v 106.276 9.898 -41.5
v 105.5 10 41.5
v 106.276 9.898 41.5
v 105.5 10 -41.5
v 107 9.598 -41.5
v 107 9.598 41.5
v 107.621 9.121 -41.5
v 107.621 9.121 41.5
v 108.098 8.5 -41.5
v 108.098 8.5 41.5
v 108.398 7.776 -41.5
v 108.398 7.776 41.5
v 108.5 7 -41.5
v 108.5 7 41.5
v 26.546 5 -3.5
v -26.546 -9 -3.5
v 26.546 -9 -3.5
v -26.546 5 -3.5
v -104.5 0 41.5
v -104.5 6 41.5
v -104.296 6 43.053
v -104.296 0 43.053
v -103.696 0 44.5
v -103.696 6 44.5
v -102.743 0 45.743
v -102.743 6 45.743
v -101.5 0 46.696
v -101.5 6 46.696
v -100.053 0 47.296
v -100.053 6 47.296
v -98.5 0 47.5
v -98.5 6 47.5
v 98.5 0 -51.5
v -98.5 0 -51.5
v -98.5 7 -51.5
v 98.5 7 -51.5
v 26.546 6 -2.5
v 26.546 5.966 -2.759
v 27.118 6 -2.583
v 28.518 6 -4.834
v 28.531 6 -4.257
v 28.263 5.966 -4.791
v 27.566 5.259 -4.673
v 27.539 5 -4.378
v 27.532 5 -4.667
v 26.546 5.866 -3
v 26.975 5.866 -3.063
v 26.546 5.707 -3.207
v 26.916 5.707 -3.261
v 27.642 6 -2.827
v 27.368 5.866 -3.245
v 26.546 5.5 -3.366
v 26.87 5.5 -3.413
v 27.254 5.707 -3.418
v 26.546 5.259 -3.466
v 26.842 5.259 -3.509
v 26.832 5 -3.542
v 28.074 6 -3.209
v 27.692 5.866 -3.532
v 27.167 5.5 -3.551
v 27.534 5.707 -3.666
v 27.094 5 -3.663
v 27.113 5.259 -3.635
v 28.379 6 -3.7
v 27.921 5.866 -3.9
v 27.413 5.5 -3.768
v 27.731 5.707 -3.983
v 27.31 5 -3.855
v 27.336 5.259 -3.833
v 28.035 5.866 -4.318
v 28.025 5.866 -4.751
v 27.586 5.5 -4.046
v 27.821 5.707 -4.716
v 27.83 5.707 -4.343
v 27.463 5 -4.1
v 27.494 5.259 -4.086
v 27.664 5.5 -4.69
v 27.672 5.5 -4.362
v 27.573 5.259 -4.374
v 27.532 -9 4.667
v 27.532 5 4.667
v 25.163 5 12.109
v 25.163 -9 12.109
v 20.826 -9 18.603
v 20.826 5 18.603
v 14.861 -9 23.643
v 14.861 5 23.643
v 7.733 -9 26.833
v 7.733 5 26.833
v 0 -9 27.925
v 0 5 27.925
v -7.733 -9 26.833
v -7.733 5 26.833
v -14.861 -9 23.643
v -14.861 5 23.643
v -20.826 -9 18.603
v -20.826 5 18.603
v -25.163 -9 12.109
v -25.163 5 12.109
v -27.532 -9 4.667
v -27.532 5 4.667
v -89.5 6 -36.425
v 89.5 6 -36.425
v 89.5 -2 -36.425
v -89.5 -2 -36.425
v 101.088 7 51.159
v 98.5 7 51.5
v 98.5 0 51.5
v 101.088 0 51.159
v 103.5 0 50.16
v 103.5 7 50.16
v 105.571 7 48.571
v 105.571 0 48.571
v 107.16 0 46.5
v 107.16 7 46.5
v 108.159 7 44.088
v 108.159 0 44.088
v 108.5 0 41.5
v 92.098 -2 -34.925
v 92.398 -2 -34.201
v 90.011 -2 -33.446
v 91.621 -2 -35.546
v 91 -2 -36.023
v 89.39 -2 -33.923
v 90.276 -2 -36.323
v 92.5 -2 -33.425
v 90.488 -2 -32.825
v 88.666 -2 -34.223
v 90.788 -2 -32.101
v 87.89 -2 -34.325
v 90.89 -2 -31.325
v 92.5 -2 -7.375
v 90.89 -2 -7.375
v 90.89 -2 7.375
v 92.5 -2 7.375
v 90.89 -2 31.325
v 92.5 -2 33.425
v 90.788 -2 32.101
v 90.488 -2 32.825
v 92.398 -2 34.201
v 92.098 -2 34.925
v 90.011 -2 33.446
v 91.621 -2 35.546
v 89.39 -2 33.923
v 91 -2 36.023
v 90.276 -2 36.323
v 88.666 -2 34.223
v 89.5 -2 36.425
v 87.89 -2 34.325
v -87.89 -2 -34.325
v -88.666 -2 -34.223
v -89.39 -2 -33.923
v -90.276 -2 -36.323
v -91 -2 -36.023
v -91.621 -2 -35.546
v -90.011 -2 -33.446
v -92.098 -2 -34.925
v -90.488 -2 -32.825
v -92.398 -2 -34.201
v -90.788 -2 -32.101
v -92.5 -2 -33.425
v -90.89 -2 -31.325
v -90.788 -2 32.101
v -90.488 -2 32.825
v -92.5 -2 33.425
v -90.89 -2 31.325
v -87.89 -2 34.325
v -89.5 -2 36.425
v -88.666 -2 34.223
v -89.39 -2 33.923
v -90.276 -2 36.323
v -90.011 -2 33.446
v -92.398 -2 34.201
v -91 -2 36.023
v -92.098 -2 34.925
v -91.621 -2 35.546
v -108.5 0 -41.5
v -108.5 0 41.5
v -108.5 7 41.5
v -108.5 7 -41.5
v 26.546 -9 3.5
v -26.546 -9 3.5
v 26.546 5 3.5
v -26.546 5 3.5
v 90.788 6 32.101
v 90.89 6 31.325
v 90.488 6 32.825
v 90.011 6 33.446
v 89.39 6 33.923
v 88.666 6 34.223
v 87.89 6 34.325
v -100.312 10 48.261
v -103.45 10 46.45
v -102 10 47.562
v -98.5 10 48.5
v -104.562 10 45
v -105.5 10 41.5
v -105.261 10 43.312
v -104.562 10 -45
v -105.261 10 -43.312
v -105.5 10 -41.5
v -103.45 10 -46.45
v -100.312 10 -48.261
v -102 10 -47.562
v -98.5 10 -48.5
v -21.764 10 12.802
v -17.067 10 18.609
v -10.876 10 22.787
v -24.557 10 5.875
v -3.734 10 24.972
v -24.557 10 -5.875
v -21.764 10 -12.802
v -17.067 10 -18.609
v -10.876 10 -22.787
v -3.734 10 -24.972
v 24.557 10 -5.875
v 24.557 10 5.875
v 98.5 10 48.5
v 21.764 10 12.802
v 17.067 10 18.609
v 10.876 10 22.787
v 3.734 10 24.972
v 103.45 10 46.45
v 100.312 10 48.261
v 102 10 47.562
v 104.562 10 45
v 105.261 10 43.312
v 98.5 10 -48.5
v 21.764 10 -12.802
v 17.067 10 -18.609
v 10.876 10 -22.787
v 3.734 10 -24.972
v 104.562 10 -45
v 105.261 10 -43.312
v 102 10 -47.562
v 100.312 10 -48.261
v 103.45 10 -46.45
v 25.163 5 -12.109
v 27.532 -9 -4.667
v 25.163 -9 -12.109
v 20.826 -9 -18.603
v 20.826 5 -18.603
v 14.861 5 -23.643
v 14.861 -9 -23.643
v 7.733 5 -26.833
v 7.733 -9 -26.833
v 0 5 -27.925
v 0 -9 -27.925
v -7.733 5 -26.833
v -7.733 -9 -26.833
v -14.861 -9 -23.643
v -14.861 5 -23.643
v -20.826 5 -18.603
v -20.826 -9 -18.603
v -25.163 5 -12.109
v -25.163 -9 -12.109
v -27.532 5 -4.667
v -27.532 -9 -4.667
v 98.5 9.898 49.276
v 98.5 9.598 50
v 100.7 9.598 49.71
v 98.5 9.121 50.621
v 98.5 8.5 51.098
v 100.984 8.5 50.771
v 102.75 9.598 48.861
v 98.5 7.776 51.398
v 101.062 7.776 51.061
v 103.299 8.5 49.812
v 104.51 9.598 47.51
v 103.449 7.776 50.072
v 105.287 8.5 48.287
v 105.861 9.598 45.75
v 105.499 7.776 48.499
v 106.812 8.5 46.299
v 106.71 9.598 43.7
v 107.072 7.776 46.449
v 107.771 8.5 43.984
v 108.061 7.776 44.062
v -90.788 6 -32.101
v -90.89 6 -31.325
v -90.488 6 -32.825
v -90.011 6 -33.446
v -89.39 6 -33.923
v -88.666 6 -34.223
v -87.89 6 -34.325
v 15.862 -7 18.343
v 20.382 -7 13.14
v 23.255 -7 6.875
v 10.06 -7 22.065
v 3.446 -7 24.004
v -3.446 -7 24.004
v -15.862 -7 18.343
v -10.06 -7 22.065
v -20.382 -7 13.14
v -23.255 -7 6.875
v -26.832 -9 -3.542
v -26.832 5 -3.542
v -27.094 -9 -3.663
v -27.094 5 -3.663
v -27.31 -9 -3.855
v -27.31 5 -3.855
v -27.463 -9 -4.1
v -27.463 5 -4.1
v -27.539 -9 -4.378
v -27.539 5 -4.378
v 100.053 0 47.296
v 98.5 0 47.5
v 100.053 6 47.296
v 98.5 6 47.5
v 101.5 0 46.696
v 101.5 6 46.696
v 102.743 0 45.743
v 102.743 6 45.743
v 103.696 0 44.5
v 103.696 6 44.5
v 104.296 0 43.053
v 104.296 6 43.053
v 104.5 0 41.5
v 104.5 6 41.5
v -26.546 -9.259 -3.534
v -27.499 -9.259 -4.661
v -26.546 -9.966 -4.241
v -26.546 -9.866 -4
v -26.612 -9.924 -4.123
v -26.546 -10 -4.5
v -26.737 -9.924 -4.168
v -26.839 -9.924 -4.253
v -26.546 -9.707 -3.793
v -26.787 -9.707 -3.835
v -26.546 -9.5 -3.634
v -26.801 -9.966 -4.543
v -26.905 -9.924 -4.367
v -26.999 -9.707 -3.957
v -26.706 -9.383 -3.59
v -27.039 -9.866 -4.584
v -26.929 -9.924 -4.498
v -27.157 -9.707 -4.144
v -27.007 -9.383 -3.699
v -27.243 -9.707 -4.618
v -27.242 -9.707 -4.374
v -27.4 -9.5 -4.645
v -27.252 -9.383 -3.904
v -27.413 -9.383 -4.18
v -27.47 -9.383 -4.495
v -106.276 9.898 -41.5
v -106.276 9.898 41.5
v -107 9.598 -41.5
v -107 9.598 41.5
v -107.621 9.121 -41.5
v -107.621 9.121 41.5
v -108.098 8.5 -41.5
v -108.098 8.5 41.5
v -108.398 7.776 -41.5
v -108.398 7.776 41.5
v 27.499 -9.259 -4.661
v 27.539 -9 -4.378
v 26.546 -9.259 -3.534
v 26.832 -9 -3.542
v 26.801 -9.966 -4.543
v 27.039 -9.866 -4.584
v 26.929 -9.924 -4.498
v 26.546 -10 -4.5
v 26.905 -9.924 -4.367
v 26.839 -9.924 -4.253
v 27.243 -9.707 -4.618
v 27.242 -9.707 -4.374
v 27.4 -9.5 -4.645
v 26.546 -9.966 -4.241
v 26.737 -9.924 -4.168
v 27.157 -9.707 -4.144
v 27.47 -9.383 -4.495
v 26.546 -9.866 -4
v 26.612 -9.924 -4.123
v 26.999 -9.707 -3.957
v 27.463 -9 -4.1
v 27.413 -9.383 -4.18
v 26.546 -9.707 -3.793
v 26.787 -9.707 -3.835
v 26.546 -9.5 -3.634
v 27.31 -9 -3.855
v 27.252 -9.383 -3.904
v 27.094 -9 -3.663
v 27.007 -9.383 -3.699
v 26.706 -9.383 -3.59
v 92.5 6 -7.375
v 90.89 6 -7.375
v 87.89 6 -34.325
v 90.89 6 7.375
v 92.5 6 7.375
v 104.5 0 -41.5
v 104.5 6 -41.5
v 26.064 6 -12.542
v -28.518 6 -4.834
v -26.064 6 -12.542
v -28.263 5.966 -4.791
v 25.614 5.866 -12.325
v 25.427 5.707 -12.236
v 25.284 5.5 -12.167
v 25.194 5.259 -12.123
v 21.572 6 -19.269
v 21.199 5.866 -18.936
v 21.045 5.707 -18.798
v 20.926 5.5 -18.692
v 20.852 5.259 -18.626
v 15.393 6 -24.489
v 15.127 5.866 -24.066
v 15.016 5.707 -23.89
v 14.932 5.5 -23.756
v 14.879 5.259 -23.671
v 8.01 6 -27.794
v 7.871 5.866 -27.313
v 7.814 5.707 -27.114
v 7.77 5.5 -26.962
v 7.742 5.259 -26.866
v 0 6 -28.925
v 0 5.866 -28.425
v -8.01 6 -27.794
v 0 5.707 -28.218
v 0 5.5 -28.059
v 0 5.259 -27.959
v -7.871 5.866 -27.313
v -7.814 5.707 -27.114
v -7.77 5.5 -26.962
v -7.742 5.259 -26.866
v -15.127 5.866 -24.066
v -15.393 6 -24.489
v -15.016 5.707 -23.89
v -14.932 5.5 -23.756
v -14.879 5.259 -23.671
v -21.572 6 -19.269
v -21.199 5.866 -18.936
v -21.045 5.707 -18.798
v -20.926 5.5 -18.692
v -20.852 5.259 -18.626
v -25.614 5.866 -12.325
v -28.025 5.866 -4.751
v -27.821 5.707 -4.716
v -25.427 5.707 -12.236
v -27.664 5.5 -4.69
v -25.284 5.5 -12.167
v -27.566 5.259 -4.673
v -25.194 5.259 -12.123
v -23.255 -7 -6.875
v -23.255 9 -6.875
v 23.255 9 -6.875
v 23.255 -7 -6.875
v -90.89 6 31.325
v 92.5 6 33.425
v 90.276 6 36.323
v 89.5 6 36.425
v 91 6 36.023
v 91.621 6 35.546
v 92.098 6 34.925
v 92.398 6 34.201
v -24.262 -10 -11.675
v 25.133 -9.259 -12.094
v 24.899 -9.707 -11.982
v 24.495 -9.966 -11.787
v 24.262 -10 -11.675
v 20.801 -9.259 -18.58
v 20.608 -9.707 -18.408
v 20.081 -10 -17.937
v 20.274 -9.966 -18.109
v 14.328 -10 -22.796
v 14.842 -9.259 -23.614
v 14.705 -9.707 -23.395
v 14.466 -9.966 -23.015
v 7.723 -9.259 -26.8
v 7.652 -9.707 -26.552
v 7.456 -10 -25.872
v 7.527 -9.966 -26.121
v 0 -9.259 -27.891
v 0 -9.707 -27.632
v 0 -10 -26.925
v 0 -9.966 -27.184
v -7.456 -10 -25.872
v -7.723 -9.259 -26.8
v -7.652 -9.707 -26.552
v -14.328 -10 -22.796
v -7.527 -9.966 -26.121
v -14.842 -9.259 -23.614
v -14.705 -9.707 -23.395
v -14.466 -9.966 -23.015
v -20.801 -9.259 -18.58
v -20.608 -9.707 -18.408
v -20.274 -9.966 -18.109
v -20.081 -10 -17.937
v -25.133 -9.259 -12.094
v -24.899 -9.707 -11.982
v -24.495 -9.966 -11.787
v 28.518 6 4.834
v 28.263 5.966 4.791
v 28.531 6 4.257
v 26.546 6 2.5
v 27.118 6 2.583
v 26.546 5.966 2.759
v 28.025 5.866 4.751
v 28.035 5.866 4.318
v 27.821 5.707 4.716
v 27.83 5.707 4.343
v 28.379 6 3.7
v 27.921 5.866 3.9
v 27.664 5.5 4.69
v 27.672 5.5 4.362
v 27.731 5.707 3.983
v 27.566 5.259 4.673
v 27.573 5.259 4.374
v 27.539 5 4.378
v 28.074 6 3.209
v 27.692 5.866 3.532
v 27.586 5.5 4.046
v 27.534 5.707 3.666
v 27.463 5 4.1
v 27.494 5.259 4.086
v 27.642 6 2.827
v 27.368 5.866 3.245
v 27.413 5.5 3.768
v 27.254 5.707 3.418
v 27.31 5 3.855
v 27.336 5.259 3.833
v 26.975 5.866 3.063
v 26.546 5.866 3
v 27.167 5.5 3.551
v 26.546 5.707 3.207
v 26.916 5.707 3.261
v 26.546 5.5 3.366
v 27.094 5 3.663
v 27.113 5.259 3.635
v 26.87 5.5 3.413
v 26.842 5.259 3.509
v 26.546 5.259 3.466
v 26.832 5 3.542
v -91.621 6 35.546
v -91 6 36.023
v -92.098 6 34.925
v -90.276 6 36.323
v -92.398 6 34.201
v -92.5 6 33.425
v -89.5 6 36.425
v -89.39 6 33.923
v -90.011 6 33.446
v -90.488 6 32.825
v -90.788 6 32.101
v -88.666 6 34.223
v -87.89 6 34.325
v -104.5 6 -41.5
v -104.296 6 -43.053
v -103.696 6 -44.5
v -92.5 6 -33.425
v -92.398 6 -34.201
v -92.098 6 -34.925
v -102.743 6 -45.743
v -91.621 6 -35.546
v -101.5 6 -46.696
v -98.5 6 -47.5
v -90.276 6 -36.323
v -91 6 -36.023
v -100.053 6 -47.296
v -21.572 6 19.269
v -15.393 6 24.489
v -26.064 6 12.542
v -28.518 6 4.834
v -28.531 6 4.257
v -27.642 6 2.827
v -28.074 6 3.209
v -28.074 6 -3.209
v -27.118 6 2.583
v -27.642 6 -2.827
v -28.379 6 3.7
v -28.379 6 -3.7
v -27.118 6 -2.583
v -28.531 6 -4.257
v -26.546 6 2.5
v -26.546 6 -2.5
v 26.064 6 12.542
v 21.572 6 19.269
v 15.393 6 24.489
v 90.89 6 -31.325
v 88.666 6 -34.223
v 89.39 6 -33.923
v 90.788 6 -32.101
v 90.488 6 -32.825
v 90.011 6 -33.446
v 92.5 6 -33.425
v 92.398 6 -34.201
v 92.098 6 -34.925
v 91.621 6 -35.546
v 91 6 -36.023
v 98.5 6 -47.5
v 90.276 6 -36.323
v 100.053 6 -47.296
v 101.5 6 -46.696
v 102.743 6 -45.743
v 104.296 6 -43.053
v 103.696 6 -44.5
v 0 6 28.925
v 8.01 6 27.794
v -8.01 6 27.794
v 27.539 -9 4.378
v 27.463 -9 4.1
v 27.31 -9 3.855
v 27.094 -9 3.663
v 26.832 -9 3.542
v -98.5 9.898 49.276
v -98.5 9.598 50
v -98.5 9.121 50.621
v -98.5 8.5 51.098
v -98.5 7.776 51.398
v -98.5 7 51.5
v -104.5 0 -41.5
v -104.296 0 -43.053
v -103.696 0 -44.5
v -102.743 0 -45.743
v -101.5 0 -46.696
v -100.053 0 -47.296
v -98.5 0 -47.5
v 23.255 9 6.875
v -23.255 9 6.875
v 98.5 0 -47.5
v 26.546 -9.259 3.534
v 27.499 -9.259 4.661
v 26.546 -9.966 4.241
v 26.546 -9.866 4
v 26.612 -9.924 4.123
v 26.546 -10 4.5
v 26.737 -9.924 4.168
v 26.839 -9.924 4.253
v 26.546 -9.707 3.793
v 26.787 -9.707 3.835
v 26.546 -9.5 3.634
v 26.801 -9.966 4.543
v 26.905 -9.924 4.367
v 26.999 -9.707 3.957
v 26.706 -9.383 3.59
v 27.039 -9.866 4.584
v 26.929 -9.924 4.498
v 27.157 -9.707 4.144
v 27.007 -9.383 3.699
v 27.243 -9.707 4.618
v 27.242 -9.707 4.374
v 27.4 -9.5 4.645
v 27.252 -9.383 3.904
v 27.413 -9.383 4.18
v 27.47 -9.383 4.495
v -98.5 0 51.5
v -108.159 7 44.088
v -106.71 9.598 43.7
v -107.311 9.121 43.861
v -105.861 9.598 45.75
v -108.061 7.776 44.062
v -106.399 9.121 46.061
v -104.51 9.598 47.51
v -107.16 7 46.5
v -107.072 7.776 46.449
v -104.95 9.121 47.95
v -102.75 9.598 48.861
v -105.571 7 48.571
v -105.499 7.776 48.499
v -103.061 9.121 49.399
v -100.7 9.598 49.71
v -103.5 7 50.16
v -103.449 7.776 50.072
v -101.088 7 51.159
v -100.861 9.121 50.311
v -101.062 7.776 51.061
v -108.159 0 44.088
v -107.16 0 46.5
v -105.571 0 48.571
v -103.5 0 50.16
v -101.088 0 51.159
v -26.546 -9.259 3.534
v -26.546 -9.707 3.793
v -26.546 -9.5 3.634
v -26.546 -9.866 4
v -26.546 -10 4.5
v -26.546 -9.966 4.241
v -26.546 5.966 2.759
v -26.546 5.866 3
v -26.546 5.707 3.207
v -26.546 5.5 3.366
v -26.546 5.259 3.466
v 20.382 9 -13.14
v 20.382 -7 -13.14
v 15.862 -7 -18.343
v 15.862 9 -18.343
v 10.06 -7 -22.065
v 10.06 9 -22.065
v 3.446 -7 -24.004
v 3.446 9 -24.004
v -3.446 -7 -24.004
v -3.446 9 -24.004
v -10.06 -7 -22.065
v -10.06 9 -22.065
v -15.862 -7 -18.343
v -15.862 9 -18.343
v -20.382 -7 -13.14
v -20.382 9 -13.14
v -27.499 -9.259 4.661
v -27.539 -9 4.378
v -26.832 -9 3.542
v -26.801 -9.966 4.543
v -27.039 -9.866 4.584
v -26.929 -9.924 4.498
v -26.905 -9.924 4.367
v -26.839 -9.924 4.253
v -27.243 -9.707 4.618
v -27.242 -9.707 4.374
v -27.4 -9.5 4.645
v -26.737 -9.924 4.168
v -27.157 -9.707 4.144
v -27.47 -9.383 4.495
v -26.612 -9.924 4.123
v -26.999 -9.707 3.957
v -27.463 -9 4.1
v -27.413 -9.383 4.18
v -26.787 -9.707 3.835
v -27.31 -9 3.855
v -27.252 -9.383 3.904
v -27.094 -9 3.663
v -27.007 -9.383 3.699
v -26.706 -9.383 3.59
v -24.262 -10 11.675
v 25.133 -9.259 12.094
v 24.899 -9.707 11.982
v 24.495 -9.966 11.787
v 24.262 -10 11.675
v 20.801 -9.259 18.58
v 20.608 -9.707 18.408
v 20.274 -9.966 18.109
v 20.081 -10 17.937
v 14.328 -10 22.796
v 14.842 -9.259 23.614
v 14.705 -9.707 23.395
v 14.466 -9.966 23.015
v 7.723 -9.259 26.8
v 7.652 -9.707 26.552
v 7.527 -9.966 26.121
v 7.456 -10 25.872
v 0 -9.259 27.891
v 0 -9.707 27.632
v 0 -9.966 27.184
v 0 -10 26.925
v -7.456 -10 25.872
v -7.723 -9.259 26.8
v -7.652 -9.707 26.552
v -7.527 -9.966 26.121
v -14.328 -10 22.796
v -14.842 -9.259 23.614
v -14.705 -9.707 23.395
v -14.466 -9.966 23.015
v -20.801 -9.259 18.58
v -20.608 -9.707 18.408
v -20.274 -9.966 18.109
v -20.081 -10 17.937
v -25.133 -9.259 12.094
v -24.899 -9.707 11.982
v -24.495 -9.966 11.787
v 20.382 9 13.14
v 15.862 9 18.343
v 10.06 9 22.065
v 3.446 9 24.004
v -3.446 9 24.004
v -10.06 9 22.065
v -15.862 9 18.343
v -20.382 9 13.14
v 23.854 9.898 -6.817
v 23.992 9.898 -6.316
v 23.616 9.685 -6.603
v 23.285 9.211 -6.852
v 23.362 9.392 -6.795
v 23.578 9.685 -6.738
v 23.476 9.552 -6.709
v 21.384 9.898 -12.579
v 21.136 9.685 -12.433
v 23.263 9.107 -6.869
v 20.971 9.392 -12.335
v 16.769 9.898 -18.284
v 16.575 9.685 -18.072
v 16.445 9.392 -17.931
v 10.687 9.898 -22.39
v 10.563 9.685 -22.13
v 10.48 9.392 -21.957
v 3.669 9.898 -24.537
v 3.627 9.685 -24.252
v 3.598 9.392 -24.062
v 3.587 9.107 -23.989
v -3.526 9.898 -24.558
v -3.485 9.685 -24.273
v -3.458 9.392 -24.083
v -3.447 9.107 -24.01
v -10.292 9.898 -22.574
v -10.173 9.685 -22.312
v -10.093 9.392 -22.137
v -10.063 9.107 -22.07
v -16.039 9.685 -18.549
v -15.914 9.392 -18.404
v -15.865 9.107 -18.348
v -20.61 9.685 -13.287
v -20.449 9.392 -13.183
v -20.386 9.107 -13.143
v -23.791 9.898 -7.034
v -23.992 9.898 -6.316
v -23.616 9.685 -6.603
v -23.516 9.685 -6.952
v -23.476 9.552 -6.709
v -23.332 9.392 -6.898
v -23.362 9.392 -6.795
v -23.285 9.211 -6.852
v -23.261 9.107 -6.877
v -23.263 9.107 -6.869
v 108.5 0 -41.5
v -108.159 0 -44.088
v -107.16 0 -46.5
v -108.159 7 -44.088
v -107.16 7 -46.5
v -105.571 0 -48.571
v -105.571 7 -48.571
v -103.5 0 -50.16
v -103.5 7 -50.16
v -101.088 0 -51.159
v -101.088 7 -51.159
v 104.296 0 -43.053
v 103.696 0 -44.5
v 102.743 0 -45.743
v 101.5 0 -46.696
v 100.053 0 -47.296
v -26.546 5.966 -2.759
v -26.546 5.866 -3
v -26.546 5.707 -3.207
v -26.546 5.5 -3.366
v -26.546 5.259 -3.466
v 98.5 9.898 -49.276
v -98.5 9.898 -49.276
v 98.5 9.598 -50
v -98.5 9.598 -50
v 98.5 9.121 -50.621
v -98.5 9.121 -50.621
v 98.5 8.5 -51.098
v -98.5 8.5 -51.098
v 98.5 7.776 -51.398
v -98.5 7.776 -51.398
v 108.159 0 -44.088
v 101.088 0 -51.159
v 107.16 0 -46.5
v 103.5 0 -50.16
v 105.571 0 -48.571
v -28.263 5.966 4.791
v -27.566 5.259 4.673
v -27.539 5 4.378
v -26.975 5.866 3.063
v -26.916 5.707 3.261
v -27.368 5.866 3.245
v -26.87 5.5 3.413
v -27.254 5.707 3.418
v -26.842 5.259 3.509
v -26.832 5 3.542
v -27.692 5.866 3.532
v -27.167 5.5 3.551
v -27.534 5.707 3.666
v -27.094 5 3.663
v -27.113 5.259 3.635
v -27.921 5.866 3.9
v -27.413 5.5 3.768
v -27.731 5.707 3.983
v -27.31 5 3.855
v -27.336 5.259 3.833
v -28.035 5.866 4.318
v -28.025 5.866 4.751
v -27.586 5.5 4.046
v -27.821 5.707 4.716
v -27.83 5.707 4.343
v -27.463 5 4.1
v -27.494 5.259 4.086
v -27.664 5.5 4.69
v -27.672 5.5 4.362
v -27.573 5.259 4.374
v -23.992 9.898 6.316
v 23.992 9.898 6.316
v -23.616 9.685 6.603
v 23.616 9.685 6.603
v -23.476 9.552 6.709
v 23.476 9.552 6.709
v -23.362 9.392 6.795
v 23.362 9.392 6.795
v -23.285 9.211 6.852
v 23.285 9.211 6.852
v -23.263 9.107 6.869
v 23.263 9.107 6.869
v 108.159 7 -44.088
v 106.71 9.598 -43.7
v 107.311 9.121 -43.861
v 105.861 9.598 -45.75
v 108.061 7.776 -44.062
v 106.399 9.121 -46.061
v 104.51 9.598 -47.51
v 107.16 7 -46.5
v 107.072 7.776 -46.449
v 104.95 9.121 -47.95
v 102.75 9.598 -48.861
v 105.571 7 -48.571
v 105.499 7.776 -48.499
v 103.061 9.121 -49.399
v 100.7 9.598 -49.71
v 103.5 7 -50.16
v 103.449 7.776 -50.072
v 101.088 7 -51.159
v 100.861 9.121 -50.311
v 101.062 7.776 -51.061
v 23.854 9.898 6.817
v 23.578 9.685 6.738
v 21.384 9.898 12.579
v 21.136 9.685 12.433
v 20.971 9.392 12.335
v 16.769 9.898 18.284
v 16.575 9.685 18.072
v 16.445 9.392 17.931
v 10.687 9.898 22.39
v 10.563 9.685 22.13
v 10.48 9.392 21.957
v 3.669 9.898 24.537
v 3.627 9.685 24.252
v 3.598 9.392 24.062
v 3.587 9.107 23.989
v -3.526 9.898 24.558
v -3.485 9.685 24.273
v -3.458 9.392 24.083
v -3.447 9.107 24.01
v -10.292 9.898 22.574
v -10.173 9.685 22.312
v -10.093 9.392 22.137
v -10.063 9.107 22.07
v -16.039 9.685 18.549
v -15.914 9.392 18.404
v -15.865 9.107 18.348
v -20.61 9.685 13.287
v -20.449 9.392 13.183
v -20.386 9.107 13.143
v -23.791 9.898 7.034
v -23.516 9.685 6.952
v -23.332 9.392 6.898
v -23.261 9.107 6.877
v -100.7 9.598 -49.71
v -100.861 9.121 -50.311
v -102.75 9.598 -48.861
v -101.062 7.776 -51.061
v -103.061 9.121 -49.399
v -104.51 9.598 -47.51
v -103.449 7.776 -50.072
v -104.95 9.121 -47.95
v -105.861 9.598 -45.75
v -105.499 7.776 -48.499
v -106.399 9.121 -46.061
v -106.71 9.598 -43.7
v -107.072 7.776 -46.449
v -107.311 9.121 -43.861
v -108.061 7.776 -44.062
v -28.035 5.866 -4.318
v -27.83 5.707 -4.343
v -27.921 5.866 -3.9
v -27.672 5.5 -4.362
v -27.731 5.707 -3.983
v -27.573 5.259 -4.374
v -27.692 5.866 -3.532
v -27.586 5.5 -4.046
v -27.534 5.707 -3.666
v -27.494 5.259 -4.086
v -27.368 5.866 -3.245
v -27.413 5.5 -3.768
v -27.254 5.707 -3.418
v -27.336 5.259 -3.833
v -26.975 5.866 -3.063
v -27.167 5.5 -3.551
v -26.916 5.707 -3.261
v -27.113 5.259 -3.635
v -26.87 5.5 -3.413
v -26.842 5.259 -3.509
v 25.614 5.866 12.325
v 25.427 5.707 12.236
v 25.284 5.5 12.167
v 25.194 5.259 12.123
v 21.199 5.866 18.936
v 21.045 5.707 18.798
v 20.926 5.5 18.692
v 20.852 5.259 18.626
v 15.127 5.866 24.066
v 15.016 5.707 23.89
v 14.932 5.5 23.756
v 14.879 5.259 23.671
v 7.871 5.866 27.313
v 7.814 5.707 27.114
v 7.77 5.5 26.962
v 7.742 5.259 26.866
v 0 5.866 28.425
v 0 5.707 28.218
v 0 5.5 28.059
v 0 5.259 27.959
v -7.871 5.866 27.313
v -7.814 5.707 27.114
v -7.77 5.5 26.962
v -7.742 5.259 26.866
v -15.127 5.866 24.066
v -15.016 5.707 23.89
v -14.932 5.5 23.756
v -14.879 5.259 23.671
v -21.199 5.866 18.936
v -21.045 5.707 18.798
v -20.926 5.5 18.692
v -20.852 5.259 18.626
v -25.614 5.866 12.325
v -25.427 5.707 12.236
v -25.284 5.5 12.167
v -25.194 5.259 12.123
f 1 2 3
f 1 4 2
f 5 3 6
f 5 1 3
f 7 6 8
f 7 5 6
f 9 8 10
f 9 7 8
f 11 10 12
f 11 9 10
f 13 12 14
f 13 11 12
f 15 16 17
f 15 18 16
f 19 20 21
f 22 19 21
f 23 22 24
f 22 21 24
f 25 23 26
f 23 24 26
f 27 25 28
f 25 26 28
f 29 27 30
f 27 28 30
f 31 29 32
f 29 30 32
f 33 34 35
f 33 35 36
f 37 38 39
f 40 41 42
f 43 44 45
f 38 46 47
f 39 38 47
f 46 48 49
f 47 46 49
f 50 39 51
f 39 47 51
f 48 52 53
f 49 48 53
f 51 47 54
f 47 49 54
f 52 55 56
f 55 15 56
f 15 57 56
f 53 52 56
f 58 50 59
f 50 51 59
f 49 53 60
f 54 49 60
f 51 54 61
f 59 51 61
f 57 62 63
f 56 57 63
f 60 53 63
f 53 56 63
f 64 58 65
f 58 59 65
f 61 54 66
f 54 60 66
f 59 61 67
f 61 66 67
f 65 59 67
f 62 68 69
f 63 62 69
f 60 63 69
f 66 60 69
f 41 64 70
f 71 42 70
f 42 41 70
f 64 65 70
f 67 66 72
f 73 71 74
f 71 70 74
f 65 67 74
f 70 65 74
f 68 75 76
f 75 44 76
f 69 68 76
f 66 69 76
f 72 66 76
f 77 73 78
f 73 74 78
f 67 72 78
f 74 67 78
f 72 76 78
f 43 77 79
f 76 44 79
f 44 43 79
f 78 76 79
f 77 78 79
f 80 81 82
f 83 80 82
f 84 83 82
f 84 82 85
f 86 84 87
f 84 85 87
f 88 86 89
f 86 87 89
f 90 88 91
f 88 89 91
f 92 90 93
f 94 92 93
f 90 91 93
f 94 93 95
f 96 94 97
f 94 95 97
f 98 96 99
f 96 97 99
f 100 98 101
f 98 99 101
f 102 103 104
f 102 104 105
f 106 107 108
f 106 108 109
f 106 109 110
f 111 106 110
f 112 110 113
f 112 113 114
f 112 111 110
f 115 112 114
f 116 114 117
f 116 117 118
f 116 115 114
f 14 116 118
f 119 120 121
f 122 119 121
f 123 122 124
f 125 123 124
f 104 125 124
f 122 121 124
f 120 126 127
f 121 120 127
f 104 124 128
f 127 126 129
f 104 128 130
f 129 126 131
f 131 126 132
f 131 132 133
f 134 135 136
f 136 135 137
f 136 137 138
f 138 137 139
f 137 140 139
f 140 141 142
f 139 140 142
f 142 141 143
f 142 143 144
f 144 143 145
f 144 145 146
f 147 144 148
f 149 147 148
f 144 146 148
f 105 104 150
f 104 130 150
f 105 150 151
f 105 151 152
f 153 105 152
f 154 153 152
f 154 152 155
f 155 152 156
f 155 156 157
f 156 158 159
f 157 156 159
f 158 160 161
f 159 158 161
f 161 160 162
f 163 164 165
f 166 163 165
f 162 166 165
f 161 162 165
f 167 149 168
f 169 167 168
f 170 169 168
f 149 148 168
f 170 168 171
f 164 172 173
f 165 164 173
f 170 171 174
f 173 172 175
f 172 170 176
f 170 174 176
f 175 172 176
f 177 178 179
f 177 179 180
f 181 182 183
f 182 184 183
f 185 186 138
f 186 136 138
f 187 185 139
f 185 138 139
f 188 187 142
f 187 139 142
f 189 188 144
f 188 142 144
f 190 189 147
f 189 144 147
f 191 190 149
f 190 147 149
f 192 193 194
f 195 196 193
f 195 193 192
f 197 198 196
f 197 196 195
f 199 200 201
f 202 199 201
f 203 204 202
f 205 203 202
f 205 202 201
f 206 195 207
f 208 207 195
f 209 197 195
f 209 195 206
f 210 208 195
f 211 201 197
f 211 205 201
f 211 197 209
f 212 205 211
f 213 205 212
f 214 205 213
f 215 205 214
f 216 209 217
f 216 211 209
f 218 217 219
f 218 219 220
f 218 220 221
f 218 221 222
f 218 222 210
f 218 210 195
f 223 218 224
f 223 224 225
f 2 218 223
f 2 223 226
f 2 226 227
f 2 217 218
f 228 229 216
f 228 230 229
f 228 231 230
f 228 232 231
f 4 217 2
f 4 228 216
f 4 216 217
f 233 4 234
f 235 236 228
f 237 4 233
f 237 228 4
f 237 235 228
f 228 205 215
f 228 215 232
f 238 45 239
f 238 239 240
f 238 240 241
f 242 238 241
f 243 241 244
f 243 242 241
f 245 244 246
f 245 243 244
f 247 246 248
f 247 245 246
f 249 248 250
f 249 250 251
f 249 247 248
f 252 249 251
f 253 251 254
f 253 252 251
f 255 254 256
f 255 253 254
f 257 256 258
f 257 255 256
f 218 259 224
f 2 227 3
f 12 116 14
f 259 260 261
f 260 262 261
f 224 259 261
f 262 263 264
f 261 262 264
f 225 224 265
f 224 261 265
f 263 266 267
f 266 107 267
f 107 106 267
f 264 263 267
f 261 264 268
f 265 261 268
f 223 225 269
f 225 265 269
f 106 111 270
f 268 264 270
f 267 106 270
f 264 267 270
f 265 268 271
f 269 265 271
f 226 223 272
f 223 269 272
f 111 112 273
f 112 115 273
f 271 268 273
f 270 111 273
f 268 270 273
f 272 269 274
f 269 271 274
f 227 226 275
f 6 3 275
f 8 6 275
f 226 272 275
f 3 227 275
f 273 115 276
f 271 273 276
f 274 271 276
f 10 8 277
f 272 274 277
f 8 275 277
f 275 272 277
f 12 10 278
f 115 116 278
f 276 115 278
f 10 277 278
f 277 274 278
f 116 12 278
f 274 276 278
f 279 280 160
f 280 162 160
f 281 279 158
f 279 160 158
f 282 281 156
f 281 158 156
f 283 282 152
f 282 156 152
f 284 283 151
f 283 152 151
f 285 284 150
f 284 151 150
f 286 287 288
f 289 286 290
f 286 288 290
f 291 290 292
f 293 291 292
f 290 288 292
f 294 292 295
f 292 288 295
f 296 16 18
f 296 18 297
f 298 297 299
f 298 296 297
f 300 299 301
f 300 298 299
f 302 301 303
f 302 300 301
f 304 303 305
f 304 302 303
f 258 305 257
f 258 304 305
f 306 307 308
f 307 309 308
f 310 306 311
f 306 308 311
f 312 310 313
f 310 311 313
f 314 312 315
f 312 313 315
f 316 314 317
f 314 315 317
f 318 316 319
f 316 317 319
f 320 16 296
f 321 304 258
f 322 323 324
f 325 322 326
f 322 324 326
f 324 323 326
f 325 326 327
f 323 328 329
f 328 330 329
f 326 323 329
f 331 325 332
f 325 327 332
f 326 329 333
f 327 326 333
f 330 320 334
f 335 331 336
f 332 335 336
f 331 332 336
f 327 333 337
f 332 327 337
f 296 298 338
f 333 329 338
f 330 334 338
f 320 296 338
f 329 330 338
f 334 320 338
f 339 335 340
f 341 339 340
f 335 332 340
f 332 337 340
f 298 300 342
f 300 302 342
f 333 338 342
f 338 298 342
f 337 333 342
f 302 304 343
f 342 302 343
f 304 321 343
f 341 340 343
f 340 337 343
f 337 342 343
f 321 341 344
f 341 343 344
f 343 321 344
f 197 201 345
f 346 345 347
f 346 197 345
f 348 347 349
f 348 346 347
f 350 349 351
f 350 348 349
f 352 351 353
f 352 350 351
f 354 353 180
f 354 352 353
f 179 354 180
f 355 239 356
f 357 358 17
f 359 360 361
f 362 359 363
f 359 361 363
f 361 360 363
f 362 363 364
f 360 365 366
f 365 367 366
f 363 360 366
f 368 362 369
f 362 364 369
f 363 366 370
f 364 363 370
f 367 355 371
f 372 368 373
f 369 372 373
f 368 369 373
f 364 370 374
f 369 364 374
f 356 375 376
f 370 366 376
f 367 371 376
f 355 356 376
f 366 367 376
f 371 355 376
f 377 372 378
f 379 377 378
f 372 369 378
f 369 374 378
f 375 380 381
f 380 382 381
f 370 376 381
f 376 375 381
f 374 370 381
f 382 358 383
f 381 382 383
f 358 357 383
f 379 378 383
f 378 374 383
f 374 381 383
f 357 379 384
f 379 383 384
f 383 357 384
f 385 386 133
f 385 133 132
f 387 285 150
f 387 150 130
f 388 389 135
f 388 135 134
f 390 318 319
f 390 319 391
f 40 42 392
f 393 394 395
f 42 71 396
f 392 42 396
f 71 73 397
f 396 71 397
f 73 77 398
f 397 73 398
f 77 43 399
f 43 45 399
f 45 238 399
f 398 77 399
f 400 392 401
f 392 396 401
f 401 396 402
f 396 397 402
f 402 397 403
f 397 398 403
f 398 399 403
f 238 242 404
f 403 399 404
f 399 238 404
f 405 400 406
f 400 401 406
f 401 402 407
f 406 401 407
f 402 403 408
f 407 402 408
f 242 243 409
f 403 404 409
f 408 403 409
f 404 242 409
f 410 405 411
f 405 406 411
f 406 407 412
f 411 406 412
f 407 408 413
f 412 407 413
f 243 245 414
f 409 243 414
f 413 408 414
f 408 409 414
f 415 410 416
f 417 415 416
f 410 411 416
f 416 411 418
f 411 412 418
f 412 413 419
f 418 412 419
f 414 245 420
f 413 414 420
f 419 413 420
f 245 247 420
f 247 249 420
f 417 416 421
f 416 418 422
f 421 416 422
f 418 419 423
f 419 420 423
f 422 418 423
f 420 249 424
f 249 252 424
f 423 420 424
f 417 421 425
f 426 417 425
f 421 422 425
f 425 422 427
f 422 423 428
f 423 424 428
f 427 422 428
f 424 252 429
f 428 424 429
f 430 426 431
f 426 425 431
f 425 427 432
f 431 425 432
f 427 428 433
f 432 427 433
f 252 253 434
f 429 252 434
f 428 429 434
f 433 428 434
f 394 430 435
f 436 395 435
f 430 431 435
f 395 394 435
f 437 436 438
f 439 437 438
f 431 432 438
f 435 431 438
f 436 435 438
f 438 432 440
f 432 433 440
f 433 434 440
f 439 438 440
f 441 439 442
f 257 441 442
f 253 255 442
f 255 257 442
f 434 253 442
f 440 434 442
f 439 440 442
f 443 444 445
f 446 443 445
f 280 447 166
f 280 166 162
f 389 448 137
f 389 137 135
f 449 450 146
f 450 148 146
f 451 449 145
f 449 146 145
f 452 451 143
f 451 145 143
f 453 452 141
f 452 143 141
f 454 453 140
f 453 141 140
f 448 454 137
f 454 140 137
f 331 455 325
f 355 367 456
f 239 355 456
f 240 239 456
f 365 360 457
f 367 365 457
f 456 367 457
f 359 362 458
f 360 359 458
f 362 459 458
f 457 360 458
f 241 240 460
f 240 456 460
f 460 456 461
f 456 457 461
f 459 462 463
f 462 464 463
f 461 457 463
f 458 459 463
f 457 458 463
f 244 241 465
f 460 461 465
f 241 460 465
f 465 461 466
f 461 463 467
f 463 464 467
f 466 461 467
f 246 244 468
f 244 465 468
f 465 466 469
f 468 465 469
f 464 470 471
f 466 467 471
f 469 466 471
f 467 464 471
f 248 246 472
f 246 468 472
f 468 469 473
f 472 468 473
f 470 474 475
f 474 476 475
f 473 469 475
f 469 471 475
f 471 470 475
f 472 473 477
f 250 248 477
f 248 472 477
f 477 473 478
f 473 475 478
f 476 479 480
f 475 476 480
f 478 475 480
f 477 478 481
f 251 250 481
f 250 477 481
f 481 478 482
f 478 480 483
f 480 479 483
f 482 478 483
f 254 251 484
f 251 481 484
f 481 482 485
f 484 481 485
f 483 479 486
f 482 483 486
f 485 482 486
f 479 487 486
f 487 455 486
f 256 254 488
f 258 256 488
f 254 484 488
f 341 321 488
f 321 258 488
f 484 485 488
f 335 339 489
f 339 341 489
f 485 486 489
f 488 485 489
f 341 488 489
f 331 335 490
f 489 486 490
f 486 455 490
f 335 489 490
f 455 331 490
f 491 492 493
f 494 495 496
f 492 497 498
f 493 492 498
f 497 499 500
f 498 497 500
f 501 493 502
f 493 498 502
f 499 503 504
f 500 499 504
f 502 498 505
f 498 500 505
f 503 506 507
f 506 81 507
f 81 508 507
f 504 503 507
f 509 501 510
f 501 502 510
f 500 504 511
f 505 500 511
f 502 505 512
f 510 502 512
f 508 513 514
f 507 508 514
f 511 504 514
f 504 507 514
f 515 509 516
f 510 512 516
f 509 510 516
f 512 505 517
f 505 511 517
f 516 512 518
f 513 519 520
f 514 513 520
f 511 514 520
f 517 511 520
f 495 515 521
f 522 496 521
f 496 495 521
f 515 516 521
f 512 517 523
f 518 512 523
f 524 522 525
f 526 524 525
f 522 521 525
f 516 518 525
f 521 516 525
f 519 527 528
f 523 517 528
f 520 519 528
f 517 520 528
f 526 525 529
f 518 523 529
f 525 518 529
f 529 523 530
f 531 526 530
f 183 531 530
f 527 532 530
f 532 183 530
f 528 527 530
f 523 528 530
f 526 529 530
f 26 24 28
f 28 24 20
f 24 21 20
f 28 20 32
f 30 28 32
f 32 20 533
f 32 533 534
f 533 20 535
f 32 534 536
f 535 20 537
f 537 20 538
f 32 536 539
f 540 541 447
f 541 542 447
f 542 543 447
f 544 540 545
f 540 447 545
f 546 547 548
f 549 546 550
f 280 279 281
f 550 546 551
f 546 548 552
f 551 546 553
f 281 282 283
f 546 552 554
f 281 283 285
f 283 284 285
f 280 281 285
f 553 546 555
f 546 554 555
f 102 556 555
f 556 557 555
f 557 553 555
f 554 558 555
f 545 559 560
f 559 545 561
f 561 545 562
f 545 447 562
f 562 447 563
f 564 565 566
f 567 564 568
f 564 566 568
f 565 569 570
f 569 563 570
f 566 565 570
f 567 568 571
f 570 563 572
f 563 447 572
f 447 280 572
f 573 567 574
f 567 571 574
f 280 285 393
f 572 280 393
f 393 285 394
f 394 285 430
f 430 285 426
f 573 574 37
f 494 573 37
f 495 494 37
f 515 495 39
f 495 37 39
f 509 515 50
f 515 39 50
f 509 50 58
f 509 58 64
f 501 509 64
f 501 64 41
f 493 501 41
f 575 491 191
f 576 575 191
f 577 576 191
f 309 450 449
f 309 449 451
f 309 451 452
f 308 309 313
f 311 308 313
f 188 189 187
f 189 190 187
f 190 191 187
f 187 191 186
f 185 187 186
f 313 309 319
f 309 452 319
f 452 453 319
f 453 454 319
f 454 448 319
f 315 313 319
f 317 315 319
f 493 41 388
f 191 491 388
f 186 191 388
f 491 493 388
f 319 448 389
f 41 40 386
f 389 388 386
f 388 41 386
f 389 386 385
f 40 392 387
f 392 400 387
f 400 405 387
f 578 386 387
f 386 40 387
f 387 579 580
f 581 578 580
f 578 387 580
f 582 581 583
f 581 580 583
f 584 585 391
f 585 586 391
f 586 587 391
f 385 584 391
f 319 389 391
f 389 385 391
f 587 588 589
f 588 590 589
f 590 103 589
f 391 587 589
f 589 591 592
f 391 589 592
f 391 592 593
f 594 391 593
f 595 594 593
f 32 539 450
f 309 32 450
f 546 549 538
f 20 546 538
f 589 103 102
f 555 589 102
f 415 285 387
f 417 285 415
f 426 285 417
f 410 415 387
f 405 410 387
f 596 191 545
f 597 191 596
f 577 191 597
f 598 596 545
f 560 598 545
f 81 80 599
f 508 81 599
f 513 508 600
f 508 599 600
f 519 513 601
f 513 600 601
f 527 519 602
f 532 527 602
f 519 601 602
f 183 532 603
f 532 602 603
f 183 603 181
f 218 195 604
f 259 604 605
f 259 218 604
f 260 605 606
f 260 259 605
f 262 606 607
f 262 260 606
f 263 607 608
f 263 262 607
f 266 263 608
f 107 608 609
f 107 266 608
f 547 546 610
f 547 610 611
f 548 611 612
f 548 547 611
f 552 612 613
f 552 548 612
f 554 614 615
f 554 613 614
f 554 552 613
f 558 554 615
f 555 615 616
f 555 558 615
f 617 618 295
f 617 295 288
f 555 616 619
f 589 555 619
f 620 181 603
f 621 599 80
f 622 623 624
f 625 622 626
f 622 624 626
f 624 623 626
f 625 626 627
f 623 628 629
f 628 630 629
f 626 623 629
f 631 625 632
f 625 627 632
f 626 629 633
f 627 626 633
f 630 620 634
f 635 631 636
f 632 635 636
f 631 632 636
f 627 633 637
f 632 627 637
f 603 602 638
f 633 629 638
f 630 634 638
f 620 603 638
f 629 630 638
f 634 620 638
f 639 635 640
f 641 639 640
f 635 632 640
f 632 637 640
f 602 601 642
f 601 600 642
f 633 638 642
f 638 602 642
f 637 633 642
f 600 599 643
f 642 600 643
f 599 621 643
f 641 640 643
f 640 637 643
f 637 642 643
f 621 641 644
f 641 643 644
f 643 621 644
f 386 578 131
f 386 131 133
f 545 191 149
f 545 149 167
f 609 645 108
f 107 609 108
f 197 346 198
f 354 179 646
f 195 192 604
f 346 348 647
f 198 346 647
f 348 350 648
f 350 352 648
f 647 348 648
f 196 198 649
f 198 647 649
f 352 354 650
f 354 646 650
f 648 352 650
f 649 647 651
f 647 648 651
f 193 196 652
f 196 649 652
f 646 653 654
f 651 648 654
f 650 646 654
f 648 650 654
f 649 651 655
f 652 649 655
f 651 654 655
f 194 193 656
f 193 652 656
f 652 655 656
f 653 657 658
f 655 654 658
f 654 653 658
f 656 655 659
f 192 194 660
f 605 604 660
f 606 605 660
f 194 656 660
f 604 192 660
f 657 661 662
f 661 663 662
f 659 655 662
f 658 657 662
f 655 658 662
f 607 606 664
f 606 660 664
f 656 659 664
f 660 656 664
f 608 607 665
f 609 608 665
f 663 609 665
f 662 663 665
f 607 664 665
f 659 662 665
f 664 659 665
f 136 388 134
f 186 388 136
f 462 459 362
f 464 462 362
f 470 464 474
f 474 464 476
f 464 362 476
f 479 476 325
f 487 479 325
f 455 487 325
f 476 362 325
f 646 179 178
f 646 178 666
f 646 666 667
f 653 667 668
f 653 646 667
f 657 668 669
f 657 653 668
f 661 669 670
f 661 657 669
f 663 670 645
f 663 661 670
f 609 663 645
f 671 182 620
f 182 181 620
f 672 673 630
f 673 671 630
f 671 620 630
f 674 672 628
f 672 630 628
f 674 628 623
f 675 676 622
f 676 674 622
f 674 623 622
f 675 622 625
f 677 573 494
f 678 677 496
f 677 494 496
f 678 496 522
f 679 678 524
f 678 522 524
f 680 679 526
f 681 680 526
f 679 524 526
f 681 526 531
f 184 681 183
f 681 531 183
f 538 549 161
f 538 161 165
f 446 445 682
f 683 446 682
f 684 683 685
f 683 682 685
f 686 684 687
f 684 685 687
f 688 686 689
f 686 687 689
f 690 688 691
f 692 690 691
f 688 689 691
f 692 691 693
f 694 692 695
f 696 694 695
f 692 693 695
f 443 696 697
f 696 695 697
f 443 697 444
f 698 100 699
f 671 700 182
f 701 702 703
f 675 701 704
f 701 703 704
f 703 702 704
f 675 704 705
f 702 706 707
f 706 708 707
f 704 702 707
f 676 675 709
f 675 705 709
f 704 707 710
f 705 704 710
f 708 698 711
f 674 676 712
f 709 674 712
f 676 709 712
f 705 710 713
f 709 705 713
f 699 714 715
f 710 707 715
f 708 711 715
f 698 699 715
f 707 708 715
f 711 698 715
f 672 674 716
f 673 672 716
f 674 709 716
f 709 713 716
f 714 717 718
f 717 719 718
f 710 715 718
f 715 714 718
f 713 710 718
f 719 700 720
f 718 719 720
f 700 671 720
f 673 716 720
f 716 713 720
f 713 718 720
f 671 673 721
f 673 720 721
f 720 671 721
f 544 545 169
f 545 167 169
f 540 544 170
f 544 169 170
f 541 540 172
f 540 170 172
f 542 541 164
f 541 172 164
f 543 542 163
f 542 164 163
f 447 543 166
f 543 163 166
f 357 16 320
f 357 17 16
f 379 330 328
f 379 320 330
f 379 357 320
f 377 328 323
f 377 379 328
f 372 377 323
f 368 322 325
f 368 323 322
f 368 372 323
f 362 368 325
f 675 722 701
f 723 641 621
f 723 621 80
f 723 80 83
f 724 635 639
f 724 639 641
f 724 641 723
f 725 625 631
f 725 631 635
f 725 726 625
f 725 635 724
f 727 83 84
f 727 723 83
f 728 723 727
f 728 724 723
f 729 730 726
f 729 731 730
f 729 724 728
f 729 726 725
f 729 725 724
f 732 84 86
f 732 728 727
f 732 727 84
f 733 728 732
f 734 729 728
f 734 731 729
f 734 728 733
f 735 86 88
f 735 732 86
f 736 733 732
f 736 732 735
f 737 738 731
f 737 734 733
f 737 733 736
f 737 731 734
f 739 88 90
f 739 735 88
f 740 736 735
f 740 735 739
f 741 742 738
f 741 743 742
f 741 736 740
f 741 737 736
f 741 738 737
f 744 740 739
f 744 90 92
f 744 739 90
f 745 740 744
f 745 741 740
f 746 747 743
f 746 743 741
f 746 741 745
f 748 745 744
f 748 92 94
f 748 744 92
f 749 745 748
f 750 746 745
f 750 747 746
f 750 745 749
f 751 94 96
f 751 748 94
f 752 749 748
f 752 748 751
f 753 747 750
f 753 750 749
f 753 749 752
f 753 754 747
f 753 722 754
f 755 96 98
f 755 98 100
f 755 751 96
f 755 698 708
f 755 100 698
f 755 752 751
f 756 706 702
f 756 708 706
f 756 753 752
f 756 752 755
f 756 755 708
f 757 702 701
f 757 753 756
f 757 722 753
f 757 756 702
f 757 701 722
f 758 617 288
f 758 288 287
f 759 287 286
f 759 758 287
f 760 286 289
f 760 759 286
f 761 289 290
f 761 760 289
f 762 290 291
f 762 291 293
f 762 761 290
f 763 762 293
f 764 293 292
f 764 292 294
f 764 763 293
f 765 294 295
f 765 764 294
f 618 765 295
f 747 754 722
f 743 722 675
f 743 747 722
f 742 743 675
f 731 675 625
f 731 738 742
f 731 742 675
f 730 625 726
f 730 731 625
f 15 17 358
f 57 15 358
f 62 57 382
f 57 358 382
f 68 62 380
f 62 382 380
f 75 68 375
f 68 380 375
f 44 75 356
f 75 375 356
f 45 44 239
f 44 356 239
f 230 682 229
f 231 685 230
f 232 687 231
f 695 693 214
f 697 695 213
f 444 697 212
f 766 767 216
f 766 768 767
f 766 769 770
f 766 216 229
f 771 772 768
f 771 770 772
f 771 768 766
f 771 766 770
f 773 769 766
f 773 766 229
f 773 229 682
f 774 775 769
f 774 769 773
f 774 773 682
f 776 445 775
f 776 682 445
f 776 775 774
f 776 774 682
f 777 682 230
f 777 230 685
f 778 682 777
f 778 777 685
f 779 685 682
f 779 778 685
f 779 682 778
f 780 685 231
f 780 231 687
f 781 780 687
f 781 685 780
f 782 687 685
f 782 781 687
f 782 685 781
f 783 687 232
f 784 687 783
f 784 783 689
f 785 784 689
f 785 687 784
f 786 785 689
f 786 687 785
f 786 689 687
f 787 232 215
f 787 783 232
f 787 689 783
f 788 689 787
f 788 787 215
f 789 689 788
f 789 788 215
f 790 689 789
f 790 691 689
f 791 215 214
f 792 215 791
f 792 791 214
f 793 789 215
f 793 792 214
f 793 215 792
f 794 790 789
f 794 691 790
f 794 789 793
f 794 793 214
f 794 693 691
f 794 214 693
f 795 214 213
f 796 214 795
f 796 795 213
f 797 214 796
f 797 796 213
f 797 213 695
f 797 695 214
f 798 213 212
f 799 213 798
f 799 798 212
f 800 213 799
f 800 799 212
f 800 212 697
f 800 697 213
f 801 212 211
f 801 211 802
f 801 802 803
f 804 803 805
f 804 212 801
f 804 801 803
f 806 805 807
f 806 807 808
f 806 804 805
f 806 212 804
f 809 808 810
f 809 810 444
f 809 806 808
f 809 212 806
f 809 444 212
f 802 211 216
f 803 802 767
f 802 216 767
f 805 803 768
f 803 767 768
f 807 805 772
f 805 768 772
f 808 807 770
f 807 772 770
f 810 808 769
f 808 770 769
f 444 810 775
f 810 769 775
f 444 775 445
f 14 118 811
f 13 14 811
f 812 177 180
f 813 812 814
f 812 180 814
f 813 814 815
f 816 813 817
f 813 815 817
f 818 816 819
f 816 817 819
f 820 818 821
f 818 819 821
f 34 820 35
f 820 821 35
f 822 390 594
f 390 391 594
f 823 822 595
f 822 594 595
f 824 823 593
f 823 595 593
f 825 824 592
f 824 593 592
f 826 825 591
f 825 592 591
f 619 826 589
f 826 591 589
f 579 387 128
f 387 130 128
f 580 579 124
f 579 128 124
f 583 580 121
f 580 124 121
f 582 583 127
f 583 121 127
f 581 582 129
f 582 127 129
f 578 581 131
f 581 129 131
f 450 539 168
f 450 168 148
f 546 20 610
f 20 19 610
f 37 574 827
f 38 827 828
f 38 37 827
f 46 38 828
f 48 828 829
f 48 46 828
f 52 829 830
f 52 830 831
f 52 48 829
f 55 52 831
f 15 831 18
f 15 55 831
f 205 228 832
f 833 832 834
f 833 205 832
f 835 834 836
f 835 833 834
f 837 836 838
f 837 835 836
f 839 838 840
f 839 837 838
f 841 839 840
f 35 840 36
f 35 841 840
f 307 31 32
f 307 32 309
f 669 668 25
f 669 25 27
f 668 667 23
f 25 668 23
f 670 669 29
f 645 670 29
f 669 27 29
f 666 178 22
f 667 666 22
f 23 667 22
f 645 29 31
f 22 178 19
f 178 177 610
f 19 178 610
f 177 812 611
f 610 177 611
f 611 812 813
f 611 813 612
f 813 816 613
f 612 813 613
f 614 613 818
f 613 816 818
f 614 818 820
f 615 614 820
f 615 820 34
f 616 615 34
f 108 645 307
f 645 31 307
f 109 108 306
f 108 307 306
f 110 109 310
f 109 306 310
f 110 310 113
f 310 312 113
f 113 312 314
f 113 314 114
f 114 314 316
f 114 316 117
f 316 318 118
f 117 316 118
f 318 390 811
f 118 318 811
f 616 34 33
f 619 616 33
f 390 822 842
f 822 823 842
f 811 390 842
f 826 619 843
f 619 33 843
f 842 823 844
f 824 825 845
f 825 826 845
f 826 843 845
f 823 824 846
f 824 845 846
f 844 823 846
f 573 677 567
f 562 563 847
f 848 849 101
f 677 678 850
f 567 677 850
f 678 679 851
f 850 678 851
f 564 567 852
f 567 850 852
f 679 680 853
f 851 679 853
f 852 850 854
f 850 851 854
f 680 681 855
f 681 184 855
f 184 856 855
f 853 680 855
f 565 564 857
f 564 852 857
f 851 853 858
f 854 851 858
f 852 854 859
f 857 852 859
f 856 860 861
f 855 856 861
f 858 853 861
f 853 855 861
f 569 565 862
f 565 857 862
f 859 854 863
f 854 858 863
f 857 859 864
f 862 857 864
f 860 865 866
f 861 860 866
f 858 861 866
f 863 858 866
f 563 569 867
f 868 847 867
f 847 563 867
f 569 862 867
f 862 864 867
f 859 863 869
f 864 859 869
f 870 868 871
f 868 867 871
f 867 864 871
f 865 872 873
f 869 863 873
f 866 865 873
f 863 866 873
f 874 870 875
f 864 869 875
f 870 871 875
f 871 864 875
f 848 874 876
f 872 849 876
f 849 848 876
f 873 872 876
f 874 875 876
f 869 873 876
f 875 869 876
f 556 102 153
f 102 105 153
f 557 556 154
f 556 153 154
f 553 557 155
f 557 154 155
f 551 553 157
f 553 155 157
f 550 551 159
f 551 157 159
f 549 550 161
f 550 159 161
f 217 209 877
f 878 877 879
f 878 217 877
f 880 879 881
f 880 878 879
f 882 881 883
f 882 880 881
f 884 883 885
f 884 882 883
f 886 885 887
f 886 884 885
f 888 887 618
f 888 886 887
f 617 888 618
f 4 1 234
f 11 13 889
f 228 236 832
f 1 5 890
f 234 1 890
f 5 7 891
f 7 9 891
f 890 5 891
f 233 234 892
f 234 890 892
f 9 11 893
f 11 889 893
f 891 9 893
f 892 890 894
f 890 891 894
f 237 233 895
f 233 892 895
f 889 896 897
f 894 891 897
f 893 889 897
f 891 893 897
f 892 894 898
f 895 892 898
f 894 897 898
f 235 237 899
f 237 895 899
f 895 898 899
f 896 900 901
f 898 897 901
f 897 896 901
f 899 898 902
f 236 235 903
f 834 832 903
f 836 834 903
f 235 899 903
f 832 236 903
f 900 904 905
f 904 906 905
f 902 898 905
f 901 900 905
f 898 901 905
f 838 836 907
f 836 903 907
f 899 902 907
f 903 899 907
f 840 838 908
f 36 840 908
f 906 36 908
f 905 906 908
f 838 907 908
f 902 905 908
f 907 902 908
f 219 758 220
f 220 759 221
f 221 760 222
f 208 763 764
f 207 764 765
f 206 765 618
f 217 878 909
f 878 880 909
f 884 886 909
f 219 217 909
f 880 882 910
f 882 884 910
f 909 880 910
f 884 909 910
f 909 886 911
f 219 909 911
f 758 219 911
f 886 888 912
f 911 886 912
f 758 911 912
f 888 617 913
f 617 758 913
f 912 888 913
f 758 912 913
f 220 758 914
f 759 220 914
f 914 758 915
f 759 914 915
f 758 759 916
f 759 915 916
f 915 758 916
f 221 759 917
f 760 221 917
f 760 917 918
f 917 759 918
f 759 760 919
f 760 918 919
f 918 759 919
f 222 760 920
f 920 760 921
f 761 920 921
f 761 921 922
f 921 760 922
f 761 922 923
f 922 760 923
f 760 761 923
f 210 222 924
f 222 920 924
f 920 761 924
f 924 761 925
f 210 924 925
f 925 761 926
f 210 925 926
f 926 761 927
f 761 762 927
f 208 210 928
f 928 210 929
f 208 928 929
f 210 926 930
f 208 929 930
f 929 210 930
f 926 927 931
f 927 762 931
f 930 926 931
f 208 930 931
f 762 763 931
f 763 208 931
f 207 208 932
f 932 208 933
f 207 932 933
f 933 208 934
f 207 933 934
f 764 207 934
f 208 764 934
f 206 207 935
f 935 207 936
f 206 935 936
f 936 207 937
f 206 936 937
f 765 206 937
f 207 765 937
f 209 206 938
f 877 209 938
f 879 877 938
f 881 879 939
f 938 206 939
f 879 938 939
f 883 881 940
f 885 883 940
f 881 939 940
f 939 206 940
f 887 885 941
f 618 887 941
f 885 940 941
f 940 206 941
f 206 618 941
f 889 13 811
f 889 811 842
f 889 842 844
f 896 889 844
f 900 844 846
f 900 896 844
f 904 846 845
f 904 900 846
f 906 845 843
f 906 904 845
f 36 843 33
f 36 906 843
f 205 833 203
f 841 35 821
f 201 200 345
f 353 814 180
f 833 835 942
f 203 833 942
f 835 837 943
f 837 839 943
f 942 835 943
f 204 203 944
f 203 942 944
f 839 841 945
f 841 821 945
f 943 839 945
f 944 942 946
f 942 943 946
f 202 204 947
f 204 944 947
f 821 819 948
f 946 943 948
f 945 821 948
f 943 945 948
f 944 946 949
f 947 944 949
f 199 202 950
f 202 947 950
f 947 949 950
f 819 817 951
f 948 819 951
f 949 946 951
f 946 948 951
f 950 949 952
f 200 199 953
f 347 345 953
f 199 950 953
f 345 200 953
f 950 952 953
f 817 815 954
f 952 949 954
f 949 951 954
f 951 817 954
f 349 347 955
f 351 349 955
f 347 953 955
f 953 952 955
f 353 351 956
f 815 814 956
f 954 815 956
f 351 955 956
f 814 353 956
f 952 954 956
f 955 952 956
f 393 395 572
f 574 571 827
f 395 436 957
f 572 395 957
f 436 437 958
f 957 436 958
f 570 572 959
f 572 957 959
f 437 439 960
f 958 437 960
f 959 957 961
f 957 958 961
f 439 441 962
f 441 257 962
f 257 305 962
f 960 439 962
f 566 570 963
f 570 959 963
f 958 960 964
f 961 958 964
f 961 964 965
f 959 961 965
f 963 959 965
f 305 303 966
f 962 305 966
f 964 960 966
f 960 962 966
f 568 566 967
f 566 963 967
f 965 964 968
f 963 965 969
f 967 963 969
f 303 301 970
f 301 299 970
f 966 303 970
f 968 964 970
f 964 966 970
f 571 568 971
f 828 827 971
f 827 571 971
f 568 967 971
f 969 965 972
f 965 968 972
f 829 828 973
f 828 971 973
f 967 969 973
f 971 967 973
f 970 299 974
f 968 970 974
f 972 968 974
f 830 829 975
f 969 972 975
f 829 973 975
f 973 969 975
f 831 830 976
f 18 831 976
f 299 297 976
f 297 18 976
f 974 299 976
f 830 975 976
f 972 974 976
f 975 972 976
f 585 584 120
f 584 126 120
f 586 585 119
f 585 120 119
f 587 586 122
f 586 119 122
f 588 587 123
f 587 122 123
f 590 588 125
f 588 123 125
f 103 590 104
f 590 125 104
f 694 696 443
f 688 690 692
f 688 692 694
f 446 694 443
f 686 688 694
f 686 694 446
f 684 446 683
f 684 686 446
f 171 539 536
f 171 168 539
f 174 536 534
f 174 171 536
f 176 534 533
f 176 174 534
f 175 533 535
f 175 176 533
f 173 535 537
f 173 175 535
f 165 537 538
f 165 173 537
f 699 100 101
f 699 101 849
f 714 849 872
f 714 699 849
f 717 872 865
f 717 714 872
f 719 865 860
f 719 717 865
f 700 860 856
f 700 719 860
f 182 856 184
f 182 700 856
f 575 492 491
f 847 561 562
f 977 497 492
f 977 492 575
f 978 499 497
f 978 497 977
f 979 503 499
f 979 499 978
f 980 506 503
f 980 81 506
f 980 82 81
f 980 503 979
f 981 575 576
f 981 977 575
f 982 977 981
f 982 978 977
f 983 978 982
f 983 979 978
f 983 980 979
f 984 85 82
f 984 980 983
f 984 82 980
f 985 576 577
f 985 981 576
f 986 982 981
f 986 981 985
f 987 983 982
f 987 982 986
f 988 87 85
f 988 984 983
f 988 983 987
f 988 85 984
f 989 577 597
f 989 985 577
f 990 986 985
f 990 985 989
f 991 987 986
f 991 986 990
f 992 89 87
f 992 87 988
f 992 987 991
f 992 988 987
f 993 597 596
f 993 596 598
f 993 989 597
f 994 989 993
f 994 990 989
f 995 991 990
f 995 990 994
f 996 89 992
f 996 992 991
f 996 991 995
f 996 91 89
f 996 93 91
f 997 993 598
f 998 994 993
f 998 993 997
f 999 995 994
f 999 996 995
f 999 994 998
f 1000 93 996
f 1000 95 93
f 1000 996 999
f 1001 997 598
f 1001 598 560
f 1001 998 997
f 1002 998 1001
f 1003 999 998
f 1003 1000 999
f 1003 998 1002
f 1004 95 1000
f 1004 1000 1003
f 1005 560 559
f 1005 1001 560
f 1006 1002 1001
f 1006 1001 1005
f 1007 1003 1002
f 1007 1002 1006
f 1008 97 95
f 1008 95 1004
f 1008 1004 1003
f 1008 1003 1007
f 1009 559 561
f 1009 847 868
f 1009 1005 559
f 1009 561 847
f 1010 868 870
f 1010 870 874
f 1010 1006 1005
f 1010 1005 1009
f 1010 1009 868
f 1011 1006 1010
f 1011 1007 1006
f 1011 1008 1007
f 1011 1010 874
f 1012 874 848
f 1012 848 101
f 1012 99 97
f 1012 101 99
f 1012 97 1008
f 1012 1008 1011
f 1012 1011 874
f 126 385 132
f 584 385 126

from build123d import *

# Parameters (mm, degrees)
SKETCH1_W           = 217
SKETCH1_H           = 103
BOSS_EXTRUDE1_DEPTH = 10
FILLET1_R           = 10
SHELL1_T            = -4
FILLET2_R           = 3
BOSS_EXTRUDE3_DEPTH = 16
CUT_EXTRUDE2_DEPTH  = 17
FILLET3_R           = 1
FILLET4_R           = 1
BOSS_EXTRUDE4_DEPTH = 8
FILLET5_R           = 3


with BuildPart() as part:
    # Sketch1 → Boss-Extrude1 (new body)
    with BuildSketch(Plane(origin=(0, 0, 0), x_dir=(1, 0, 0), z_dir=(0, 1, 0))):
        Rectangle(SKETCH1_W, SKETCH1_H)
    extrude(amount=BOSS_EXTRUDE1_DEPTH)

    # Fillet1
    fillet1_edges = [part.edges().sort_by_distance(p)[0] for p in [
        (108.5, 5, 51.5),
        (-108.5, 5, 51.5),
        (-108.5, 5, -51.5),
        (108.5, 5, -51.5),
    ]]
    fillet(fillet1_edges, radius=FILLET1_R)

    # Shell1
    shell1_openings = [part.faces().sort_by_distance(p)[0] for p in [
        (0, 0, 0),
    ]]
    offset(amount=SHELL1_T, openings=shell1_openings, kind=Kind.INTERSECTION)

    # Fillet2
    fillet2_edges = [part.edges().sort_by_distance(p)[0] for p in [
        (108.5, 10, 0),
        (0, 10, 51.5),
        (0, 10, -51.5),
        (-108.5, 10, 0),
        (-105.571067812, 10, 48.571067812),
        (-105.571067812, 10, -48.571067812),
        (105.571067812, 10, -48.571067812),
        (105.571067812, 10, 48.571067812),
    ]]
    fillet(fillet2_edges, radius=FILLET2_R)

    # Sketch4 → Boss-Extrude3 (add)
    with BuildSketch(Plane.XZ.offset(-6)):
        with BuildLine():
            Line((-27.70479426, 3.5), (27.70479426, 3.5))
            ThreePointArc((27.70479426, 3.5), (0, 27.925), (-27.70479426, 3.5))
        make_face()
        with BuildLine():
            Line((-27.70479426, -3.5), (27.70479426, -3.5))
            ThreePointArc((27.70479426, -3.5), (0, -27.925), (-27.70479426, -3.5))
        make_face()
    extrude(amount=BOSS_EXTRUDE3_DEPTH)

    # Sketch2 → Cut-Extrude2 (cut)
    with BuildSketch(Plane(origin=(0, 10, 0), x_dir=(1, 0, 0), z_dir=(0, 1, 0))):
        with BuildLine():
            Line((-23.255039776, 6.875), (23.255039776, 6.875))
            ThreePointArc((23.255039776, 6.875), (0, 24.25), (-23.255039776, 6.875))
        make_face()
        with BuildLine():
            Line((-23.255039776, -6.875), (23.255039776, -6.875))
            ThreePointArc((23.255039776, -6.875), (0, -24.25), (-23.255039776, -6.875))
        make_face()
    extrude(amount=-CUT_EXTRUDE2_DEPTH, mode=Mode.SUBTRACT)

    # Fillet3
    fillet3_edges = [part.edges().sort_by_distance(p)[0] for p in [
        (0, 10, -6.875),
        (0, 10, 24.25),
        (0, 10, 6.875),
        (0, 10, -24.25),
    ]]
    fillet(fillet3_edges, radius=FILLET3_R)

    # Fillet4
    fillet4_edges = [part.edges().sort_by_distance(p)[0] for p in [
        (0, -10, 3.5),
        (-27.70479426, -2, 3.5),
        (0, 6, 3.5),
        (0, -10, 27.925),
        (27.70479426, -2, 3.5),
        (0, 6, 27.925),
        (0, -10, -3.5),
        (27.70479426, -2, -3.5),
        (0, 6, -3.5),
        (0, -10, -27.925),
        (-27.70479426, -2, -3.5),
        (0, 6, -27.925),
    ]]
    fillet(fillet4_edges, radius=FILLET4_R)

    # Sketch5 → Boss-Extrude4 (add)
    with BuildSketch(Plane.XZ.offset(-6)):
        Polygon((-92.5, 36.425), (92.5, 36.425), (92.5, 7.375), (90.89, 7.375), (90.89, 34.325), (-90.89, 34.325), (-90.89, -34.325), (90.89, -34.325), (90.89, -7.375), (92.5, -7.375), (92.5, -36.425), (-92.5, -36.425), align=None)
    extrude(amount=BOSS_EXTRUDE4_DEPTH)

    # Fillet5
    fillet5_edges = [part.edges().sort_by_distance(p)[0] for p in [
        (-92.5, 2, 36.425),
        (-92.5, 2, -36.425),
        (92.5, 2, -36.425),
        (90.89, 2, -34.325),
        (-90.89, 2, -34.325),
        (-90.89, 2, 34.325),
        (90.89, 2, 34.325),
        (92.5, 2, 36.425),
    ]]
    fillet(fillet5_edges, radius=FILLET5_R)


solid = part.part
